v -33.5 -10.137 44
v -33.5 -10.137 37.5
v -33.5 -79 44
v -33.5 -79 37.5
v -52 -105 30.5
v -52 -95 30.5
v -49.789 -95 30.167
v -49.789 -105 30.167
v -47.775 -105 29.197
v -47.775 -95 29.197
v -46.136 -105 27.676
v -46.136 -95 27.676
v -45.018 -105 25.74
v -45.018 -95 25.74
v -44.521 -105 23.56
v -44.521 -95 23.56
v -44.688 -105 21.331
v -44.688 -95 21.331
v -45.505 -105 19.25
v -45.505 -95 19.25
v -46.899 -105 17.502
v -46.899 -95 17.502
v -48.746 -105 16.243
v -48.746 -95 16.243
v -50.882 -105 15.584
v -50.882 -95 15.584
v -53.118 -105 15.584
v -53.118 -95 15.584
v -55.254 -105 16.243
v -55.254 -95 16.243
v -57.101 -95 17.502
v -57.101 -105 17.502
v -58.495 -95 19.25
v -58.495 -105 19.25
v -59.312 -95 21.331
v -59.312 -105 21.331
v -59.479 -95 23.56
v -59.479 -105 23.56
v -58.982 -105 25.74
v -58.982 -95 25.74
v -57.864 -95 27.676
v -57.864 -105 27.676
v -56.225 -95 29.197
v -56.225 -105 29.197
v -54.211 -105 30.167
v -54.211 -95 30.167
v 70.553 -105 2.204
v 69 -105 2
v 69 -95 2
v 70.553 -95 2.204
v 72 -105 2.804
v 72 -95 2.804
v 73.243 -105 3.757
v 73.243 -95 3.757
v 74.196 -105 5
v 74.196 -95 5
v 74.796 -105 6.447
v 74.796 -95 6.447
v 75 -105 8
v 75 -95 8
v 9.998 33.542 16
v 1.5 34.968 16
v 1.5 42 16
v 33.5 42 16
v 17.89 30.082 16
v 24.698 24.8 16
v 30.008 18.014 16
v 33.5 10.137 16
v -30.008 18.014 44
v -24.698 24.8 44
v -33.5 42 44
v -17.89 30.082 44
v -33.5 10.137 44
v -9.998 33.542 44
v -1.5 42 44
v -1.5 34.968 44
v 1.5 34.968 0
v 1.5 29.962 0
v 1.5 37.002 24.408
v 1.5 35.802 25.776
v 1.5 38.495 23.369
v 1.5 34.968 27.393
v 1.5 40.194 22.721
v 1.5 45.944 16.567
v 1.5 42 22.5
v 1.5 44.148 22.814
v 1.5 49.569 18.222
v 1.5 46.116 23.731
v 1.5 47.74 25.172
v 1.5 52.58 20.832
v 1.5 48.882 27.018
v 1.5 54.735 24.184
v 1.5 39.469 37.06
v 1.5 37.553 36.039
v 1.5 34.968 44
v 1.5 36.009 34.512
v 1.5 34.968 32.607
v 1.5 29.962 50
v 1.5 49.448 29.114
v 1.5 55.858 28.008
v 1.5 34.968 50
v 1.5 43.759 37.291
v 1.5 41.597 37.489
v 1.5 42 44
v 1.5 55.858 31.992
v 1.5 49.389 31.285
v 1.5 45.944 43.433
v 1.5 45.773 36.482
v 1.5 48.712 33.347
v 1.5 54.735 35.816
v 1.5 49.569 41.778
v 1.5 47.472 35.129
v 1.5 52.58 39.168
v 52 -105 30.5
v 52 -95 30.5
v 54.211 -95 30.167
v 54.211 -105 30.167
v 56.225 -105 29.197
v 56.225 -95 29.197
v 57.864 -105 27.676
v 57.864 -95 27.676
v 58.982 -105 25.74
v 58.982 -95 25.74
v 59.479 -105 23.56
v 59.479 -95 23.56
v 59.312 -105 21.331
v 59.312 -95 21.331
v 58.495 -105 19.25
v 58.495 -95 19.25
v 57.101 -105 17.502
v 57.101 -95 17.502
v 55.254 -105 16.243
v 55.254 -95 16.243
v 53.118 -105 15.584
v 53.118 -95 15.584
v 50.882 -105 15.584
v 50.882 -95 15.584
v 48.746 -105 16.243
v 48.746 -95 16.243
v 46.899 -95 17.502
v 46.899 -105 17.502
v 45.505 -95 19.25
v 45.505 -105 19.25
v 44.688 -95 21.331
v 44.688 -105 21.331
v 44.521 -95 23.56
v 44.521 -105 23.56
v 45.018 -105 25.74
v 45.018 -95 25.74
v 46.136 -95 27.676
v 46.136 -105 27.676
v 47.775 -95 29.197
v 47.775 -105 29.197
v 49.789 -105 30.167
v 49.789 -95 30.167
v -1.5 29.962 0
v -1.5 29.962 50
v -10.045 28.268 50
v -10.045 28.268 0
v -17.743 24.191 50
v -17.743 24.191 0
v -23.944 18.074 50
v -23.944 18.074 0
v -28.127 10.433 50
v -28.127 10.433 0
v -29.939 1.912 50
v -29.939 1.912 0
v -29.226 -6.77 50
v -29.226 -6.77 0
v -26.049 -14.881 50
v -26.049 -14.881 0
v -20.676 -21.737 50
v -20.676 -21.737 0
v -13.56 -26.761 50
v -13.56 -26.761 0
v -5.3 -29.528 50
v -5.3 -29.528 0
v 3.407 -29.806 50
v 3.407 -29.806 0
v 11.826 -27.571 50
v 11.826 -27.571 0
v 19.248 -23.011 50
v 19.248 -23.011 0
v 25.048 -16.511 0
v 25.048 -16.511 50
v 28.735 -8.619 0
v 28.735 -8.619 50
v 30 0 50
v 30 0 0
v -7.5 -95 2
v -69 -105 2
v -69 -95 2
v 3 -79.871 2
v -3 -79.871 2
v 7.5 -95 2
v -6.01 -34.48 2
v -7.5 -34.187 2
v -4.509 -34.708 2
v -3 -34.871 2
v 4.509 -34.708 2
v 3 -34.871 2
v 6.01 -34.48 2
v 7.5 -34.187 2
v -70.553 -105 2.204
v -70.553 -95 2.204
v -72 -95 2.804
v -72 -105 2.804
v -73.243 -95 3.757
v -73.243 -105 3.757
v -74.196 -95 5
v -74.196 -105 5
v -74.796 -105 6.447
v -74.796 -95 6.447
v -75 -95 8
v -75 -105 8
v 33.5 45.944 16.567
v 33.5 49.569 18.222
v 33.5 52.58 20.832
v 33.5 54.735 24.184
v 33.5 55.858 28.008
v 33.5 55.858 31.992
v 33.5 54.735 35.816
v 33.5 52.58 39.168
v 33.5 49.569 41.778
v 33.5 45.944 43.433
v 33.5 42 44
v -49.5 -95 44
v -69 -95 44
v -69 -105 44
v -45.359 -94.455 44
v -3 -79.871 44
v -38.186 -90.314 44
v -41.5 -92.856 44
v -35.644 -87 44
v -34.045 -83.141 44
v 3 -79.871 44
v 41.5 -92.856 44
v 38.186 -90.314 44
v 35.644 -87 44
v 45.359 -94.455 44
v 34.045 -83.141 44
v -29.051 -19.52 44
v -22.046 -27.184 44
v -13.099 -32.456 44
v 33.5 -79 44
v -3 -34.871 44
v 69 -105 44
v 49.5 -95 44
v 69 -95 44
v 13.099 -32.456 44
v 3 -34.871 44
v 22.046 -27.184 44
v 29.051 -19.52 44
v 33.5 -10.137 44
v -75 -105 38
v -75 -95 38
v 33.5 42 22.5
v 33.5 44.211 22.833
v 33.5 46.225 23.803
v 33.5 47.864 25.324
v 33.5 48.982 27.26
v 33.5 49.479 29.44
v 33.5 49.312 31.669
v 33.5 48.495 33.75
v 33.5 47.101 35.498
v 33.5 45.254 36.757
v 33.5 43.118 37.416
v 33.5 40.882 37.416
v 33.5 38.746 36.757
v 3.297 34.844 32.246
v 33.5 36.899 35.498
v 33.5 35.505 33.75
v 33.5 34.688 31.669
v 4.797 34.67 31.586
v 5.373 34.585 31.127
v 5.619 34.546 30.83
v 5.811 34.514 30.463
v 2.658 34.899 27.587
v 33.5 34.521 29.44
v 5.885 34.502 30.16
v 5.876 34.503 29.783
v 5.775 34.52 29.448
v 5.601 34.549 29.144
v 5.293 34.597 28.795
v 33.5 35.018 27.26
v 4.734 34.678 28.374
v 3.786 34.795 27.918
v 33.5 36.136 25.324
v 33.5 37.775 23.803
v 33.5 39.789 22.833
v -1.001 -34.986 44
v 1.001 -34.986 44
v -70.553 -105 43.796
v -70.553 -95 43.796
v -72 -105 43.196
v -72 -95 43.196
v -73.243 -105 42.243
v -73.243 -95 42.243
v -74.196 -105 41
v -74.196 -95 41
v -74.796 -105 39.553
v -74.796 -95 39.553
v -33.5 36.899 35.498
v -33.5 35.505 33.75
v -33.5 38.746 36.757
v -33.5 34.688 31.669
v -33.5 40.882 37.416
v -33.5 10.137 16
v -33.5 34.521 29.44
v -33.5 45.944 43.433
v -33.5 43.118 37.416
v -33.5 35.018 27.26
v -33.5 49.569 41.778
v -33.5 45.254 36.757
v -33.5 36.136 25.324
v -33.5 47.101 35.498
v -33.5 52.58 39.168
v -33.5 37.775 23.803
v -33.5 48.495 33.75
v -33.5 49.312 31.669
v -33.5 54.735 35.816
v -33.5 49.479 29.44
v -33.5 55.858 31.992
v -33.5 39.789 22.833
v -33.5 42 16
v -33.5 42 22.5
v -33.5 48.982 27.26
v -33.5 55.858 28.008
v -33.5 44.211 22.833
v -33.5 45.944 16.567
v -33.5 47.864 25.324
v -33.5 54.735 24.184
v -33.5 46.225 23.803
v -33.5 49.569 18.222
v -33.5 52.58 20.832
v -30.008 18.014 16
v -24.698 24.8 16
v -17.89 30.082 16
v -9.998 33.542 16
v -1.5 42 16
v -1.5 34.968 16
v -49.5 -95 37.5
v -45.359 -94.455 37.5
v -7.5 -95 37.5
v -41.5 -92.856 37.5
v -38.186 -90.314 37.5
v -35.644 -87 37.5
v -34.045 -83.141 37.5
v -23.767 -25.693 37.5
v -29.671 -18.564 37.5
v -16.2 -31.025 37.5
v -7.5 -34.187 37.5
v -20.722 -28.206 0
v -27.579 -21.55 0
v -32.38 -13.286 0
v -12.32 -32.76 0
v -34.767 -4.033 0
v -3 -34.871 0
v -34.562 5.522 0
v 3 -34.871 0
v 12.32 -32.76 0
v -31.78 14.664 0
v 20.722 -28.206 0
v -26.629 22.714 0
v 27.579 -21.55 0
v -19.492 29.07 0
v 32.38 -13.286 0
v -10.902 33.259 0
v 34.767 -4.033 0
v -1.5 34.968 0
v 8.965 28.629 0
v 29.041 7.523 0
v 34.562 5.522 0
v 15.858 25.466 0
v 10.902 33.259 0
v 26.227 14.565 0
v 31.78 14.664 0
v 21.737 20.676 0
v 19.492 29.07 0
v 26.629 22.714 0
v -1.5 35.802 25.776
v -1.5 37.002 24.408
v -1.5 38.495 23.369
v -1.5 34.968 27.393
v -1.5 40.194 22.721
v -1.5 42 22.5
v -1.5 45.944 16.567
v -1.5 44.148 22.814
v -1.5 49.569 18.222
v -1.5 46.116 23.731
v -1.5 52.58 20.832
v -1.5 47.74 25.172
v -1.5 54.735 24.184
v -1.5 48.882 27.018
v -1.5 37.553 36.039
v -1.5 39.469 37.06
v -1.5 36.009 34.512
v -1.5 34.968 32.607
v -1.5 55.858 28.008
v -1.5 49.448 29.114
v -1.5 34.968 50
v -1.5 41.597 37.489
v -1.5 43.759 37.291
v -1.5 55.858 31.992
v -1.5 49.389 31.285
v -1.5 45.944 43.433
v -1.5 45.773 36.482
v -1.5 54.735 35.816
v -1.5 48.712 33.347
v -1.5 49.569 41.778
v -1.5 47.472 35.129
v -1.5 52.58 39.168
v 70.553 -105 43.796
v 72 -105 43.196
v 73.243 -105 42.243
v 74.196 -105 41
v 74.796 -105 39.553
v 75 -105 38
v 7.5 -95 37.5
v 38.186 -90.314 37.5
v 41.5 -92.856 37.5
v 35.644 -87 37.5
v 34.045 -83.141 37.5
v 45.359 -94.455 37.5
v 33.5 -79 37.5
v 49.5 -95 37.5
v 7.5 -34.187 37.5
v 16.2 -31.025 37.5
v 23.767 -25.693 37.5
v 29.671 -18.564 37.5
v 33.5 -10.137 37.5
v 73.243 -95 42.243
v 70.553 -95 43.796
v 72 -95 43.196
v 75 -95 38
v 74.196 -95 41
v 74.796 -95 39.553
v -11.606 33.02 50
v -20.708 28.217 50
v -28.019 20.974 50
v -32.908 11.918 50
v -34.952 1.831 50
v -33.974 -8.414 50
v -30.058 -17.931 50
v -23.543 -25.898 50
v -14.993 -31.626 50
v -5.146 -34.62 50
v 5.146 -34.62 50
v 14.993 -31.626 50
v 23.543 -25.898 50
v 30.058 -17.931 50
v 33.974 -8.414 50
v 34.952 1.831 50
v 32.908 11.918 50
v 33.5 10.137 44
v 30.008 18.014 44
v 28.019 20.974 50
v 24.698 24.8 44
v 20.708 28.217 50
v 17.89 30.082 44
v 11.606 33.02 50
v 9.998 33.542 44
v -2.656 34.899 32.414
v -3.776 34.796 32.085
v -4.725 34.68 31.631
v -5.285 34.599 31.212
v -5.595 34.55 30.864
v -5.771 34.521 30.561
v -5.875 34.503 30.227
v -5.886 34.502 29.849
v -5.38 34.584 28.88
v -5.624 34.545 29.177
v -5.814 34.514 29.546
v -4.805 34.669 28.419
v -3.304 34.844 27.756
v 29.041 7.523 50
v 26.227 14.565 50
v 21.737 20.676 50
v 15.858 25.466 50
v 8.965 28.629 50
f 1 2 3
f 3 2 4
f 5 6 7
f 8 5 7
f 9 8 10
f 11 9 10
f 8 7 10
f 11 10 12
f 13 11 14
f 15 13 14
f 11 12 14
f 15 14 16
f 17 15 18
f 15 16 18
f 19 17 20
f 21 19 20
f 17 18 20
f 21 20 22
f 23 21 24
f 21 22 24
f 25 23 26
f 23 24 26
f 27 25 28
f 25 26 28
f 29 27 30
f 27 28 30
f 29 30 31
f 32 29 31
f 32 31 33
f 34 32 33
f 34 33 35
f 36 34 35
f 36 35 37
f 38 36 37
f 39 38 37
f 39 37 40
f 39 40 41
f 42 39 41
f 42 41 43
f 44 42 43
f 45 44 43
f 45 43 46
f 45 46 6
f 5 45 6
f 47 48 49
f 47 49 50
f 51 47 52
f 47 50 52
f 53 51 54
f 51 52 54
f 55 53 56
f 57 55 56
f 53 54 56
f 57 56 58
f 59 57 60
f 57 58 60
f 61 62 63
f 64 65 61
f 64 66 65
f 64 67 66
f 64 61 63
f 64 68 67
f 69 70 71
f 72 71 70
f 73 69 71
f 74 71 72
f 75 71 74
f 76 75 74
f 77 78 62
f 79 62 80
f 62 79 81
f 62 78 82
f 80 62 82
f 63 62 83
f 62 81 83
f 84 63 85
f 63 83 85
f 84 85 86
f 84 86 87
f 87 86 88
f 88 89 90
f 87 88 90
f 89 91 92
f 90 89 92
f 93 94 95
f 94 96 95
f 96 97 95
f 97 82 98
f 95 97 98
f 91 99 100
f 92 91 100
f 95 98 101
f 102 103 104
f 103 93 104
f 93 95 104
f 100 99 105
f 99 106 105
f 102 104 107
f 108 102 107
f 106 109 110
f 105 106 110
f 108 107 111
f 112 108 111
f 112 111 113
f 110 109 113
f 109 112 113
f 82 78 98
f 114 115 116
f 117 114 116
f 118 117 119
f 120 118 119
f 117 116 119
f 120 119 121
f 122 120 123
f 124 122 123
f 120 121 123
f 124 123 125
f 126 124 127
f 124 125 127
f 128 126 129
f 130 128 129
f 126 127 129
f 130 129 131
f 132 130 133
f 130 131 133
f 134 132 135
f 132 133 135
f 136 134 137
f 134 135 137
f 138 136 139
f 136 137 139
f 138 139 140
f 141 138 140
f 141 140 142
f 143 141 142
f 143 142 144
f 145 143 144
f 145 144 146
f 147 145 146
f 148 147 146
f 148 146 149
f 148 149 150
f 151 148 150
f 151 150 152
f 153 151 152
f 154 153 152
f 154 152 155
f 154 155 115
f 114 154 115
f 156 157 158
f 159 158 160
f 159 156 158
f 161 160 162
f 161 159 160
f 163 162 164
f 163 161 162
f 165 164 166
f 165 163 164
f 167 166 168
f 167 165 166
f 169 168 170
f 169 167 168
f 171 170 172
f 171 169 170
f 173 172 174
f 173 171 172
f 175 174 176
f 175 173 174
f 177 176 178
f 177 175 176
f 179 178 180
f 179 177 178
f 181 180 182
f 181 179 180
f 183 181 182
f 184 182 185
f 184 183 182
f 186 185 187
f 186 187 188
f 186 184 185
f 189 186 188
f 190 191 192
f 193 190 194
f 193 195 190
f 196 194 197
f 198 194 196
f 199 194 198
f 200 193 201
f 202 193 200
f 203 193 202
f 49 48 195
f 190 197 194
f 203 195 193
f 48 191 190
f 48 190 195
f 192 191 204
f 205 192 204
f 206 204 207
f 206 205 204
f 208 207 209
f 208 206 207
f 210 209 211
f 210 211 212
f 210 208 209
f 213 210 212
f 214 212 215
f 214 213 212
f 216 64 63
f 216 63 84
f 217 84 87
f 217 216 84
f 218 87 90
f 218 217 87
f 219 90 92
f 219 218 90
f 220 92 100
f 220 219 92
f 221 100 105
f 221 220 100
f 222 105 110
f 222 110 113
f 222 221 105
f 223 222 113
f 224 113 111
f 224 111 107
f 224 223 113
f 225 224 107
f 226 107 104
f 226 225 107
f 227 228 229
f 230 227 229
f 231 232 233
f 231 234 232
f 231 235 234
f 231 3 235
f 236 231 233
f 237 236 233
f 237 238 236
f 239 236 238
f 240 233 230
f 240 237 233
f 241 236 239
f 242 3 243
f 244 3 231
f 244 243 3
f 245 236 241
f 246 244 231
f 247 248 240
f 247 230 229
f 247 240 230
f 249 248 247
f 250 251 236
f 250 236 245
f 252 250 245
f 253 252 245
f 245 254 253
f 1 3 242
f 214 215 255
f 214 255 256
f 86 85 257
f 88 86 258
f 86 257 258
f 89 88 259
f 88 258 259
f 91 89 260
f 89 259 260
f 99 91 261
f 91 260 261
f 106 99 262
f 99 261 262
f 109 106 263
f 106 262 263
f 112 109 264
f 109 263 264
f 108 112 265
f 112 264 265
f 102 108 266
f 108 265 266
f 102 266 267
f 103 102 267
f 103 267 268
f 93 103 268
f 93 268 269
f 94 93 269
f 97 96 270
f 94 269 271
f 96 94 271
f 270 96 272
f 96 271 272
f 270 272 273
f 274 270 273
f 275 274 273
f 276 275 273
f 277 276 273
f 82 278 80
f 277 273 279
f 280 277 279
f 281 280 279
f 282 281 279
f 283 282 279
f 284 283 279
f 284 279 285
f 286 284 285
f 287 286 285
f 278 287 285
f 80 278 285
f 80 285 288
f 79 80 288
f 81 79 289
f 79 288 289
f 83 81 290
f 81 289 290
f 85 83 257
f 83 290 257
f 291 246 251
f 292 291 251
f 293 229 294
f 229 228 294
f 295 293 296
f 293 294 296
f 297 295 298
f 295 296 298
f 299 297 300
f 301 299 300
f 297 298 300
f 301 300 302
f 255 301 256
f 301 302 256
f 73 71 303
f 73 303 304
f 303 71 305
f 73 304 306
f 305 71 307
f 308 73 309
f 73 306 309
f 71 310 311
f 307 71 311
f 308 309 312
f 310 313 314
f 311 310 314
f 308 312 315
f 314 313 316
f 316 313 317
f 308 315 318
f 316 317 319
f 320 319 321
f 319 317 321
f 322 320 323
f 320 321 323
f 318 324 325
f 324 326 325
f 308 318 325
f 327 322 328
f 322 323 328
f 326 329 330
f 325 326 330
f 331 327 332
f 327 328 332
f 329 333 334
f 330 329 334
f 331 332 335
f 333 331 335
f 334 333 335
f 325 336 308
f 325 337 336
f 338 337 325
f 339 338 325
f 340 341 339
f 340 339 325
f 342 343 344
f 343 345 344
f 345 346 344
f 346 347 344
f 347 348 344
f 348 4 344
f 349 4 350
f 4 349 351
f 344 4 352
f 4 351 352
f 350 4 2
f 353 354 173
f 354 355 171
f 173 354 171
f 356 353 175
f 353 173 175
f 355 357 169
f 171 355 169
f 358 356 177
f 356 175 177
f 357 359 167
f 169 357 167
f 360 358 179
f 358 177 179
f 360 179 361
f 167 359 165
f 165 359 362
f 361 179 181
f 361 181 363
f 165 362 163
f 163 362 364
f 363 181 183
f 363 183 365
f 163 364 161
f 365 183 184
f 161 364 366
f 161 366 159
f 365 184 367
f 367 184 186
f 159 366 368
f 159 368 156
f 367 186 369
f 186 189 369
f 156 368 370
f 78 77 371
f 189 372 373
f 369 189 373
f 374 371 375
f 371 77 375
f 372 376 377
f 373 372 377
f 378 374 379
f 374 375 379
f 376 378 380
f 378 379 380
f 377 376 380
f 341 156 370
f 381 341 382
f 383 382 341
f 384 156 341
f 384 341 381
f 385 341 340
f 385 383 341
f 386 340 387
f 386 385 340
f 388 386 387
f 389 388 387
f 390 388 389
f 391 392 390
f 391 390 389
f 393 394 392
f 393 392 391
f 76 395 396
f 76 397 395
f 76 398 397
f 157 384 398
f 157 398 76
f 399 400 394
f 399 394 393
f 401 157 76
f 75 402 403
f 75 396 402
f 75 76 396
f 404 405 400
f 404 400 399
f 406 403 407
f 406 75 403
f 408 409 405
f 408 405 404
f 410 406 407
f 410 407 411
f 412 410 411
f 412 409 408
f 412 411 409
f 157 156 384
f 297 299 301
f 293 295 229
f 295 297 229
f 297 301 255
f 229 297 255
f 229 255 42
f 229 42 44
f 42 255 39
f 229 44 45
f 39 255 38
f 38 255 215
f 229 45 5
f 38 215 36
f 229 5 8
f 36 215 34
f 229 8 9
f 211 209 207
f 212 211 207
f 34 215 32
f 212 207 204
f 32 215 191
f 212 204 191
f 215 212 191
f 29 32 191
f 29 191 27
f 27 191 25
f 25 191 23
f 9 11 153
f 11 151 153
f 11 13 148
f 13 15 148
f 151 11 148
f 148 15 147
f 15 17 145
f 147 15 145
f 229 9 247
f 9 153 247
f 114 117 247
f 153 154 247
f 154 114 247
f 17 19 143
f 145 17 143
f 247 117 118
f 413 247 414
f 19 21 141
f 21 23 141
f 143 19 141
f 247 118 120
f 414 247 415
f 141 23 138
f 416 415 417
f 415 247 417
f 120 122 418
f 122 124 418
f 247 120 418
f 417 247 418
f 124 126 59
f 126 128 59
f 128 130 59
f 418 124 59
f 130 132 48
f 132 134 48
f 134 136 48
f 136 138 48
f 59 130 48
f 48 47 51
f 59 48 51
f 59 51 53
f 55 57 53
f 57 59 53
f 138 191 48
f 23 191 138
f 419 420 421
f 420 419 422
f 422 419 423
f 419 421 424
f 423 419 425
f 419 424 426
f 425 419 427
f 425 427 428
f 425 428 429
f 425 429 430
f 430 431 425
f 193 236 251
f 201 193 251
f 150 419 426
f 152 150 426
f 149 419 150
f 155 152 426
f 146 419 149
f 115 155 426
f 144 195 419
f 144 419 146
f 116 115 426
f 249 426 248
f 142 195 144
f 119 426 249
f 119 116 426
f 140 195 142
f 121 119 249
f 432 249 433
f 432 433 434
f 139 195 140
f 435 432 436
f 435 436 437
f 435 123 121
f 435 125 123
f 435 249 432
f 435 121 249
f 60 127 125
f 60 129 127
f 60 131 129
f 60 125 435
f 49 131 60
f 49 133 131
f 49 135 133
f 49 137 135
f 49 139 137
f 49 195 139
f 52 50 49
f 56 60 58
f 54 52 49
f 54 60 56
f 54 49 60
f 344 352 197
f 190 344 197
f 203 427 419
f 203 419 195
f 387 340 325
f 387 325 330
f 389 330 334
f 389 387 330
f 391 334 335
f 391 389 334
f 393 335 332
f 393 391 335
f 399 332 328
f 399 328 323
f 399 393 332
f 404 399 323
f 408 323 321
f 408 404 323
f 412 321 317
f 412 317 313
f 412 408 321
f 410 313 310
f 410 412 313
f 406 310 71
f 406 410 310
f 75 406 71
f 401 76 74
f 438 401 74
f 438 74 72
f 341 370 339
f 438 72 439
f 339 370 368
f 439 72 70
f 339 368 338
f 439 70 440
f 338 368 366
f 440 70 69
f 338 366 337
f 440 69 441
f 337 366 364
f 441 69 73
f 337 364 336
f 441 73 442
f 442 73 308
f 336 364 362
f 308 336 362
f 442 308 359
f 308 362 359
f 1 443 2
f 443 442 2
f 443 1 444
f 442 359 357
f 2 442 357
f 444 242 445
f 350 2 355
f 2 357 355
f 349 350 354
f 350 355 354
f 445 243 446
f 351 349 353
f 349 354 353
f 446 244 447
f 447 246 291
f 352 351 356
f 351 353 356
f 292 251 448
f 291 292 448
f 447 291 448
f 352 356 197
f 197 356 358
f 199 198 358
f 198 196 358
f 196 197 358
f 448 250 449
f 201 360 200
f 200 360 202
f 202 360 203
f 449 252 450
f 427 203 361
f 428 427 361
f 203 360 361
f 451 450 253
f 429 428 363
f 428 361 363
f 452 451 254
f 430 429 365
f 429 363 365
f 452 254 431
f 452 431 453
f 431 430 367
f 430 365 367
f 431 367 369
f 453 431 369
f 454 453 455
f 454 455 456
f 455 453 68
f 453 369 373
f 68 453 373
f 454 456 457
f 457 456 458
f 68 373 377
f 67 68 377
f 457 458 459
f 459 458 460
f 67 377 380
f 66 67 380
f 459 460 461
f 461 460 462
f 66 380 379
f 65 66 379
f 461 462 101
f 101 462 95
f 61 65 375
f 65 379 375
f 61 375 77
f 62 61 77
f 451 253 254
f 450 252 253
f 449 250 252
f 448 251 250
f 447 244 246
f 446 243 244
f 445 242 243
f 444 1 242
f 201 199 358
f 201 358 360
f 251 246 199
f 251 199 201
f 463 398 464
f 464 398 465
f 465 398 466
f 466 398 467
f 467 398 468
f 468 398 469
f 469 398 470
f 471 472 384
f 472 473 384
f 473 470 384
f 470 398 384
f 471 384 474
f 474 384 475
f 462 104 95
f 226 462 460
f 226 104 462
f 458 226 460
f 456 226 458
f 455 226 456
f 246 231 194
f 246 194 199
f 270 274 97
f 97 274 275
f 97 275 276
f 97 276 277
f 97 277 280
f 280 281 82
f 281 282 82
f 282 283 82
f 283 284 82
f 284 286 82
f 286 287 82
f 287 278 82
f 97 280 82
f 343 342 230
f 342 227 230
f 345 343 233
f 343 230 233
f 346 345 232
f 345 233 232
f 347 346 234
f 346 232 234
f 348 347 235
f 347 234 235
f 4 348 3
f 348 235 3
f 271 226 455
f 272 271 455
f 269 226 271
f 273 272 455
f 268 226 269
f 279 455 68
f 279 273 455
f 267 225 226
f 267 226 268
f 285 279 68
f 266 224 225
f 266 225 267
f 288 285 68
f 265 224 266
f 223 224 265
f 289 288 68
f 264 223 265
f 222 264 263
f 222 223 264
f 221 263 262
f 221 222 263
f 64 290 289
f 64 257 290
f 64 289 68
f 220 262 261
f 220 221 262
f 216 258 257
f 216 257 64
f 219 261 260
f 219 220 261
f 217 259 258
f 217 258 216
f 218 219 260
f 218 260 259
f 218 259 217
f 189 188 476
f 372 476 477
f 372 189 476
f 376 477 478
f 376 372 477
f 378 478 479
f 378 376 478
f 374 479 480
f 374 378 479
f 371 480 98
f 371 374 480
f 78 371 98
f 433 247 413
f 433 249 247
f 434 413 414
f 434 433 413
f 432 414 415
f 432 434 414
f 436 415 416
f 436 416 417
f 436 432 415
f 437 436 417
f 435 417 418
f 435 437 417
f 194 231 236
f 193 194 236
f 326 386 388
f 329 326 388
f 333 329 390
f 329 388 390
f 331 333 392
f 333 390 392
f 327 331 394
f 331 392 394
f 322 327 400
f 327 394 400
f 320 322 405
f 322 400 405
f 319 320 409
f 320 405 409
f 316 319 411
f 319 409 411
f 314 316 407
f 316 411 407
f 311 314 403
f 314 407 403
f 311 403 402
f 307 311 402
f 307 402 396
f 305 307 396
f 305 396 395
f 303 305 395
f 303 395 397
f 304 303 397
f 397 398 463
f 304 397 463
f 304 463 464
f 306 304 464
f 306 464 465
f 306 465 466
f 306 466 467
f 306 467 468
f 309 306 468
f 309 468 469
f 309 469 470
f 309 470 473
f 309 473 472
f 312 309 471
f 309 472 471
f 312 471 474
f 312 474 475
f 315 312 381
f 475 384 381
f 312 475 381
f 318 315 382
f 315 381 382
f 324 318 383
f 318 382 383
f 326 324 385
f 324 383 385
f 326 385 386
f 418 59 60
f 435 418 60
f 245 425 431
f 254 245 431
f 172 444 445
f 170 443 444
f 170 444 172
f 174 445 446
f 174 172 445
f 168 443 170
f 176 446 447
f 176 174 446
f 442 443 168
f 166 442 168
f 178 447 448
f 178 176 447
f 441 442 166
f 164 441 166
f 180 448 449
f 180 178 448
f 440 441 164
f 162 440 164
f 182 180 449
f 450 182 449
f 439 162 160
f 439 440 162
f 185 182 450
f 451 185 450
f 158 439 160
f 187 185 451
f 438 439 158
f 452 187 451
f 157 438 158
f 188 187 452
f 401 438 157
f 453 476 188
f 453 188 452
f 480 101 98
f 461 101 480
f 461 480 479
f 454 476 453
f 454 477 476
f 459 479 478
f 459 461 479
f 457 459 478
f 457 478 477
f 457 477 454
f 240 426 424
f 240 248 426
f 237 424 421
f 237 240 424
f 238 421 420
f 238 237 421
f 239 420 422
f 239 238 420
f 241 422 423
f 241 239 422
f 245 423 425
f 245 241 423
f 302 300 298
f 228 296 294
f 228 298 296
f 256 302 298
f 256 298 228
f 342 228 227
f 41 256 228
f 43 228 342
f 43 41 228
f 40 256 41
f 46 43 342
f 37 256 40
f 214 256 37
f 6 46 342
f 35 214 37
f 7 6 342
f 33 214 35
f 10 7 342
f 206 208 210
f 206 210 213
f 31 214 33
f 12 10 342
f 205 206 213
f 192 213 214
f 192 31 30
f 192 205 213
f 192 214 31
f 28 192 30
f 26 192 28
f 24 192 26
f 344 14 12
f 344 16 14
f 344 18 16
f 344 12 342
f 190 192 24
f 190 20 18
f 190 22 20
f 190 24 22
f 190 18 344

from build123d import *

# Parameters (mm, degrees)
SKETCH1_R           = 35
SKETCH1_R_2         = 30
BOSS_EXTRUDE1_DEPTH = 50
SKETCH4_W           = 150
SKETCH4_H           = 10
BOSS_EXTRUDE3_DEPTH = 42
BOSS_EXTRUDE5_START = -6.5
BOSS_EXTRUDE5_DEPTH = 6.5
FILLET1_R           = 16
SKETCH8_W           = 35.5
SKETCH8_H           = 64.245534278
BOSS_EXTRUDE6_DEPTH = 7.5
SKETCH9_W           = 6
SKETCH9_H           = 45
CUT_EXTRUDE1_DEPTH  = 137.330480818
SKETCH10_R          = 7.5
BOSS_EXTRUDE8_DEPTH = 67
CUT_EXTRUDE3_START  = -67
SKETCH12_R          = 30
CUT_EXTRUDE3_DEPTH  = 67
SKETCH13_W          = 3
SKETCH13_H          = 51.427571889
CUT_EXTRUDE4_DEPTH  = 67
SKETCH15_R          = 7.5
CUT_EXTRUDE5_DEPTH  = 113
FILLET2_R           = 6


with BuildPart() as part:
    # Sketch1 → Boss-Extrude1 (new body)
    with BuildSketch(Plane.XY):
        Circle(SKETCH1_R)
        Circle(SKETCH1_R_2, mode=Mode.SUBTRACT)
    extrude(amount=BOSS_EXTRUDE1_DEPTH)



with BuildPart() as body_2:
    # Sketch4 → Boss-Extrude3 (new body)
    with BuildSketch(Plane.XY.offset(2)):
        with Locations((0, -100)):
            Rectangle(SKETCH4_W, SKETCH4_H)
    extrude(amount=BOSS_EXTRUDE3_DEPTH)


with BuildPart() as part_1:
    add(part.part)

    add(body_2.part)  # Boss-Extrude5 merges body 2
    # Sketch5 → Boss-Extrude5 (add)
    with BuildSketch(Plane.XY.offset(44).offset(BOSS_EXTRUDE5_START)):
        with BuildLine():
            Line((-33.5, -10.136567466), (-33.5, -95))
            Line((-33.5, -95), (33.5, -95))
            Line((33.5, -95), (33.5, -10.136567466))
            ThreePointArc((33.5, -10.136567466), (0, -35), (-33.5, -10.136567466))
        make_face()
    extrude(amount=BOSS_EXTRUDE5_DEPTH)

    # Fillet1
    fillet1_edges = [part_1.edges().sort_by_distance(p)[0] for p in [
        (33.5, -95, 40.75),
        (-33.5, -95, 40.75),
    ]]
    fillet(fillet1_edges, radius=FILLET1_R)

    # Sketch8 → Boss-Extrude6 (add, symmetric)
    with BuildSketch(Plane(origin=(0, 0, 0), x_dir=(0, 0, -1), z_dir=(1, 0, 0))):
        with Locations((-19.75, -62.877232861)):
            Rectangle(SKETCH8_W, SKETCH8_H)
    extrude(amount=BOSS_EXTRUDE6_DEPTH, both=True)

    # Sketch9 → Cut-Extrude1 (cut, through all)
    with BuildSketch(Plane.XY.offset(44)):
        with Locations((0, -57.371191548)):
            Rectangle(SKETCH9_W, SKETCH9_H)
    extrude(amount=-CUT_EXTRUDE1_DEPTH, mode=Mode.SUBTRACT)

    # Sketch10 → Boss-Extrude8 (add)
    with BuildSketch(Plane(origin=(33.5, 0, 0), x_dir=(0, 0, -1), z_dir=(1, 0, 0))):
        with BuildLine():
            Line((-44, 42), (-44, 7))
            Line((-44, 7), (-16, 7))
            Line((-16, 7), (-16, 42))
            ThreePointArc((-16, 42), (-30, 56), (-44, 42))
        make_face()
        with Locations((-30, 42)):
            Circle(SKETCH10_R, mode=Mode.SUBTRACT)
    extrude(amount=-BOSS_EXTRUDE8_DEPTH)

    # Sketch12 → Cut-Extrude3 (cut)
    with BuildSketch(Plane.XY.offset(44).offset(CUT_EXTRUDE3_START)):
        Circle(SKETCH12_R)
    extrude(amount=CUT_EXTRUDE3_DEPTH, mode=Mode.SUBTRACT)

    # Sketch13 → Cut-Extrude4 (cut)
    with BuildSketch(Plane.XY.offset(50)):
        with Locations((0, 34.305367012)):
            Rectangle(SKETCH13_W, SKETCH13_H)
    extrude(amount=-CUT_EXTRUDE4_DEPTH, mode=Mode.SUBTRACT)

    # Sketch15 → Cut-Extrude5 (cut)
    with BuildSketch(Plane(origin=(0, 0, 0), x_dir=(1, 0, 0), z_dir=(0, 1, 0))):
        with Locations(Location((-52, -23, 0), (0, 0, 270))):
            Circle(SKETCH15_R)
        with Locations(Location((52, -23, 0), (0, 0, 270))):
            Circle(SKETCH15_R)
    extrude(amount=-CUT_EXTRUDE5_DEPTH, mode=Mode.SUBTRACT)

    # Fillet2
    fillet2_edges = [part_1.edges().sort_by_distance(p)[0] for p in [
        (-75, -100, 2),
        (75, -100, 2),
        (-75, -100, 44),
        (75, -100, 44),
    ]]
    fillet(fillet2_edges, radius=FILLET2_R)


solid = part_1.part
